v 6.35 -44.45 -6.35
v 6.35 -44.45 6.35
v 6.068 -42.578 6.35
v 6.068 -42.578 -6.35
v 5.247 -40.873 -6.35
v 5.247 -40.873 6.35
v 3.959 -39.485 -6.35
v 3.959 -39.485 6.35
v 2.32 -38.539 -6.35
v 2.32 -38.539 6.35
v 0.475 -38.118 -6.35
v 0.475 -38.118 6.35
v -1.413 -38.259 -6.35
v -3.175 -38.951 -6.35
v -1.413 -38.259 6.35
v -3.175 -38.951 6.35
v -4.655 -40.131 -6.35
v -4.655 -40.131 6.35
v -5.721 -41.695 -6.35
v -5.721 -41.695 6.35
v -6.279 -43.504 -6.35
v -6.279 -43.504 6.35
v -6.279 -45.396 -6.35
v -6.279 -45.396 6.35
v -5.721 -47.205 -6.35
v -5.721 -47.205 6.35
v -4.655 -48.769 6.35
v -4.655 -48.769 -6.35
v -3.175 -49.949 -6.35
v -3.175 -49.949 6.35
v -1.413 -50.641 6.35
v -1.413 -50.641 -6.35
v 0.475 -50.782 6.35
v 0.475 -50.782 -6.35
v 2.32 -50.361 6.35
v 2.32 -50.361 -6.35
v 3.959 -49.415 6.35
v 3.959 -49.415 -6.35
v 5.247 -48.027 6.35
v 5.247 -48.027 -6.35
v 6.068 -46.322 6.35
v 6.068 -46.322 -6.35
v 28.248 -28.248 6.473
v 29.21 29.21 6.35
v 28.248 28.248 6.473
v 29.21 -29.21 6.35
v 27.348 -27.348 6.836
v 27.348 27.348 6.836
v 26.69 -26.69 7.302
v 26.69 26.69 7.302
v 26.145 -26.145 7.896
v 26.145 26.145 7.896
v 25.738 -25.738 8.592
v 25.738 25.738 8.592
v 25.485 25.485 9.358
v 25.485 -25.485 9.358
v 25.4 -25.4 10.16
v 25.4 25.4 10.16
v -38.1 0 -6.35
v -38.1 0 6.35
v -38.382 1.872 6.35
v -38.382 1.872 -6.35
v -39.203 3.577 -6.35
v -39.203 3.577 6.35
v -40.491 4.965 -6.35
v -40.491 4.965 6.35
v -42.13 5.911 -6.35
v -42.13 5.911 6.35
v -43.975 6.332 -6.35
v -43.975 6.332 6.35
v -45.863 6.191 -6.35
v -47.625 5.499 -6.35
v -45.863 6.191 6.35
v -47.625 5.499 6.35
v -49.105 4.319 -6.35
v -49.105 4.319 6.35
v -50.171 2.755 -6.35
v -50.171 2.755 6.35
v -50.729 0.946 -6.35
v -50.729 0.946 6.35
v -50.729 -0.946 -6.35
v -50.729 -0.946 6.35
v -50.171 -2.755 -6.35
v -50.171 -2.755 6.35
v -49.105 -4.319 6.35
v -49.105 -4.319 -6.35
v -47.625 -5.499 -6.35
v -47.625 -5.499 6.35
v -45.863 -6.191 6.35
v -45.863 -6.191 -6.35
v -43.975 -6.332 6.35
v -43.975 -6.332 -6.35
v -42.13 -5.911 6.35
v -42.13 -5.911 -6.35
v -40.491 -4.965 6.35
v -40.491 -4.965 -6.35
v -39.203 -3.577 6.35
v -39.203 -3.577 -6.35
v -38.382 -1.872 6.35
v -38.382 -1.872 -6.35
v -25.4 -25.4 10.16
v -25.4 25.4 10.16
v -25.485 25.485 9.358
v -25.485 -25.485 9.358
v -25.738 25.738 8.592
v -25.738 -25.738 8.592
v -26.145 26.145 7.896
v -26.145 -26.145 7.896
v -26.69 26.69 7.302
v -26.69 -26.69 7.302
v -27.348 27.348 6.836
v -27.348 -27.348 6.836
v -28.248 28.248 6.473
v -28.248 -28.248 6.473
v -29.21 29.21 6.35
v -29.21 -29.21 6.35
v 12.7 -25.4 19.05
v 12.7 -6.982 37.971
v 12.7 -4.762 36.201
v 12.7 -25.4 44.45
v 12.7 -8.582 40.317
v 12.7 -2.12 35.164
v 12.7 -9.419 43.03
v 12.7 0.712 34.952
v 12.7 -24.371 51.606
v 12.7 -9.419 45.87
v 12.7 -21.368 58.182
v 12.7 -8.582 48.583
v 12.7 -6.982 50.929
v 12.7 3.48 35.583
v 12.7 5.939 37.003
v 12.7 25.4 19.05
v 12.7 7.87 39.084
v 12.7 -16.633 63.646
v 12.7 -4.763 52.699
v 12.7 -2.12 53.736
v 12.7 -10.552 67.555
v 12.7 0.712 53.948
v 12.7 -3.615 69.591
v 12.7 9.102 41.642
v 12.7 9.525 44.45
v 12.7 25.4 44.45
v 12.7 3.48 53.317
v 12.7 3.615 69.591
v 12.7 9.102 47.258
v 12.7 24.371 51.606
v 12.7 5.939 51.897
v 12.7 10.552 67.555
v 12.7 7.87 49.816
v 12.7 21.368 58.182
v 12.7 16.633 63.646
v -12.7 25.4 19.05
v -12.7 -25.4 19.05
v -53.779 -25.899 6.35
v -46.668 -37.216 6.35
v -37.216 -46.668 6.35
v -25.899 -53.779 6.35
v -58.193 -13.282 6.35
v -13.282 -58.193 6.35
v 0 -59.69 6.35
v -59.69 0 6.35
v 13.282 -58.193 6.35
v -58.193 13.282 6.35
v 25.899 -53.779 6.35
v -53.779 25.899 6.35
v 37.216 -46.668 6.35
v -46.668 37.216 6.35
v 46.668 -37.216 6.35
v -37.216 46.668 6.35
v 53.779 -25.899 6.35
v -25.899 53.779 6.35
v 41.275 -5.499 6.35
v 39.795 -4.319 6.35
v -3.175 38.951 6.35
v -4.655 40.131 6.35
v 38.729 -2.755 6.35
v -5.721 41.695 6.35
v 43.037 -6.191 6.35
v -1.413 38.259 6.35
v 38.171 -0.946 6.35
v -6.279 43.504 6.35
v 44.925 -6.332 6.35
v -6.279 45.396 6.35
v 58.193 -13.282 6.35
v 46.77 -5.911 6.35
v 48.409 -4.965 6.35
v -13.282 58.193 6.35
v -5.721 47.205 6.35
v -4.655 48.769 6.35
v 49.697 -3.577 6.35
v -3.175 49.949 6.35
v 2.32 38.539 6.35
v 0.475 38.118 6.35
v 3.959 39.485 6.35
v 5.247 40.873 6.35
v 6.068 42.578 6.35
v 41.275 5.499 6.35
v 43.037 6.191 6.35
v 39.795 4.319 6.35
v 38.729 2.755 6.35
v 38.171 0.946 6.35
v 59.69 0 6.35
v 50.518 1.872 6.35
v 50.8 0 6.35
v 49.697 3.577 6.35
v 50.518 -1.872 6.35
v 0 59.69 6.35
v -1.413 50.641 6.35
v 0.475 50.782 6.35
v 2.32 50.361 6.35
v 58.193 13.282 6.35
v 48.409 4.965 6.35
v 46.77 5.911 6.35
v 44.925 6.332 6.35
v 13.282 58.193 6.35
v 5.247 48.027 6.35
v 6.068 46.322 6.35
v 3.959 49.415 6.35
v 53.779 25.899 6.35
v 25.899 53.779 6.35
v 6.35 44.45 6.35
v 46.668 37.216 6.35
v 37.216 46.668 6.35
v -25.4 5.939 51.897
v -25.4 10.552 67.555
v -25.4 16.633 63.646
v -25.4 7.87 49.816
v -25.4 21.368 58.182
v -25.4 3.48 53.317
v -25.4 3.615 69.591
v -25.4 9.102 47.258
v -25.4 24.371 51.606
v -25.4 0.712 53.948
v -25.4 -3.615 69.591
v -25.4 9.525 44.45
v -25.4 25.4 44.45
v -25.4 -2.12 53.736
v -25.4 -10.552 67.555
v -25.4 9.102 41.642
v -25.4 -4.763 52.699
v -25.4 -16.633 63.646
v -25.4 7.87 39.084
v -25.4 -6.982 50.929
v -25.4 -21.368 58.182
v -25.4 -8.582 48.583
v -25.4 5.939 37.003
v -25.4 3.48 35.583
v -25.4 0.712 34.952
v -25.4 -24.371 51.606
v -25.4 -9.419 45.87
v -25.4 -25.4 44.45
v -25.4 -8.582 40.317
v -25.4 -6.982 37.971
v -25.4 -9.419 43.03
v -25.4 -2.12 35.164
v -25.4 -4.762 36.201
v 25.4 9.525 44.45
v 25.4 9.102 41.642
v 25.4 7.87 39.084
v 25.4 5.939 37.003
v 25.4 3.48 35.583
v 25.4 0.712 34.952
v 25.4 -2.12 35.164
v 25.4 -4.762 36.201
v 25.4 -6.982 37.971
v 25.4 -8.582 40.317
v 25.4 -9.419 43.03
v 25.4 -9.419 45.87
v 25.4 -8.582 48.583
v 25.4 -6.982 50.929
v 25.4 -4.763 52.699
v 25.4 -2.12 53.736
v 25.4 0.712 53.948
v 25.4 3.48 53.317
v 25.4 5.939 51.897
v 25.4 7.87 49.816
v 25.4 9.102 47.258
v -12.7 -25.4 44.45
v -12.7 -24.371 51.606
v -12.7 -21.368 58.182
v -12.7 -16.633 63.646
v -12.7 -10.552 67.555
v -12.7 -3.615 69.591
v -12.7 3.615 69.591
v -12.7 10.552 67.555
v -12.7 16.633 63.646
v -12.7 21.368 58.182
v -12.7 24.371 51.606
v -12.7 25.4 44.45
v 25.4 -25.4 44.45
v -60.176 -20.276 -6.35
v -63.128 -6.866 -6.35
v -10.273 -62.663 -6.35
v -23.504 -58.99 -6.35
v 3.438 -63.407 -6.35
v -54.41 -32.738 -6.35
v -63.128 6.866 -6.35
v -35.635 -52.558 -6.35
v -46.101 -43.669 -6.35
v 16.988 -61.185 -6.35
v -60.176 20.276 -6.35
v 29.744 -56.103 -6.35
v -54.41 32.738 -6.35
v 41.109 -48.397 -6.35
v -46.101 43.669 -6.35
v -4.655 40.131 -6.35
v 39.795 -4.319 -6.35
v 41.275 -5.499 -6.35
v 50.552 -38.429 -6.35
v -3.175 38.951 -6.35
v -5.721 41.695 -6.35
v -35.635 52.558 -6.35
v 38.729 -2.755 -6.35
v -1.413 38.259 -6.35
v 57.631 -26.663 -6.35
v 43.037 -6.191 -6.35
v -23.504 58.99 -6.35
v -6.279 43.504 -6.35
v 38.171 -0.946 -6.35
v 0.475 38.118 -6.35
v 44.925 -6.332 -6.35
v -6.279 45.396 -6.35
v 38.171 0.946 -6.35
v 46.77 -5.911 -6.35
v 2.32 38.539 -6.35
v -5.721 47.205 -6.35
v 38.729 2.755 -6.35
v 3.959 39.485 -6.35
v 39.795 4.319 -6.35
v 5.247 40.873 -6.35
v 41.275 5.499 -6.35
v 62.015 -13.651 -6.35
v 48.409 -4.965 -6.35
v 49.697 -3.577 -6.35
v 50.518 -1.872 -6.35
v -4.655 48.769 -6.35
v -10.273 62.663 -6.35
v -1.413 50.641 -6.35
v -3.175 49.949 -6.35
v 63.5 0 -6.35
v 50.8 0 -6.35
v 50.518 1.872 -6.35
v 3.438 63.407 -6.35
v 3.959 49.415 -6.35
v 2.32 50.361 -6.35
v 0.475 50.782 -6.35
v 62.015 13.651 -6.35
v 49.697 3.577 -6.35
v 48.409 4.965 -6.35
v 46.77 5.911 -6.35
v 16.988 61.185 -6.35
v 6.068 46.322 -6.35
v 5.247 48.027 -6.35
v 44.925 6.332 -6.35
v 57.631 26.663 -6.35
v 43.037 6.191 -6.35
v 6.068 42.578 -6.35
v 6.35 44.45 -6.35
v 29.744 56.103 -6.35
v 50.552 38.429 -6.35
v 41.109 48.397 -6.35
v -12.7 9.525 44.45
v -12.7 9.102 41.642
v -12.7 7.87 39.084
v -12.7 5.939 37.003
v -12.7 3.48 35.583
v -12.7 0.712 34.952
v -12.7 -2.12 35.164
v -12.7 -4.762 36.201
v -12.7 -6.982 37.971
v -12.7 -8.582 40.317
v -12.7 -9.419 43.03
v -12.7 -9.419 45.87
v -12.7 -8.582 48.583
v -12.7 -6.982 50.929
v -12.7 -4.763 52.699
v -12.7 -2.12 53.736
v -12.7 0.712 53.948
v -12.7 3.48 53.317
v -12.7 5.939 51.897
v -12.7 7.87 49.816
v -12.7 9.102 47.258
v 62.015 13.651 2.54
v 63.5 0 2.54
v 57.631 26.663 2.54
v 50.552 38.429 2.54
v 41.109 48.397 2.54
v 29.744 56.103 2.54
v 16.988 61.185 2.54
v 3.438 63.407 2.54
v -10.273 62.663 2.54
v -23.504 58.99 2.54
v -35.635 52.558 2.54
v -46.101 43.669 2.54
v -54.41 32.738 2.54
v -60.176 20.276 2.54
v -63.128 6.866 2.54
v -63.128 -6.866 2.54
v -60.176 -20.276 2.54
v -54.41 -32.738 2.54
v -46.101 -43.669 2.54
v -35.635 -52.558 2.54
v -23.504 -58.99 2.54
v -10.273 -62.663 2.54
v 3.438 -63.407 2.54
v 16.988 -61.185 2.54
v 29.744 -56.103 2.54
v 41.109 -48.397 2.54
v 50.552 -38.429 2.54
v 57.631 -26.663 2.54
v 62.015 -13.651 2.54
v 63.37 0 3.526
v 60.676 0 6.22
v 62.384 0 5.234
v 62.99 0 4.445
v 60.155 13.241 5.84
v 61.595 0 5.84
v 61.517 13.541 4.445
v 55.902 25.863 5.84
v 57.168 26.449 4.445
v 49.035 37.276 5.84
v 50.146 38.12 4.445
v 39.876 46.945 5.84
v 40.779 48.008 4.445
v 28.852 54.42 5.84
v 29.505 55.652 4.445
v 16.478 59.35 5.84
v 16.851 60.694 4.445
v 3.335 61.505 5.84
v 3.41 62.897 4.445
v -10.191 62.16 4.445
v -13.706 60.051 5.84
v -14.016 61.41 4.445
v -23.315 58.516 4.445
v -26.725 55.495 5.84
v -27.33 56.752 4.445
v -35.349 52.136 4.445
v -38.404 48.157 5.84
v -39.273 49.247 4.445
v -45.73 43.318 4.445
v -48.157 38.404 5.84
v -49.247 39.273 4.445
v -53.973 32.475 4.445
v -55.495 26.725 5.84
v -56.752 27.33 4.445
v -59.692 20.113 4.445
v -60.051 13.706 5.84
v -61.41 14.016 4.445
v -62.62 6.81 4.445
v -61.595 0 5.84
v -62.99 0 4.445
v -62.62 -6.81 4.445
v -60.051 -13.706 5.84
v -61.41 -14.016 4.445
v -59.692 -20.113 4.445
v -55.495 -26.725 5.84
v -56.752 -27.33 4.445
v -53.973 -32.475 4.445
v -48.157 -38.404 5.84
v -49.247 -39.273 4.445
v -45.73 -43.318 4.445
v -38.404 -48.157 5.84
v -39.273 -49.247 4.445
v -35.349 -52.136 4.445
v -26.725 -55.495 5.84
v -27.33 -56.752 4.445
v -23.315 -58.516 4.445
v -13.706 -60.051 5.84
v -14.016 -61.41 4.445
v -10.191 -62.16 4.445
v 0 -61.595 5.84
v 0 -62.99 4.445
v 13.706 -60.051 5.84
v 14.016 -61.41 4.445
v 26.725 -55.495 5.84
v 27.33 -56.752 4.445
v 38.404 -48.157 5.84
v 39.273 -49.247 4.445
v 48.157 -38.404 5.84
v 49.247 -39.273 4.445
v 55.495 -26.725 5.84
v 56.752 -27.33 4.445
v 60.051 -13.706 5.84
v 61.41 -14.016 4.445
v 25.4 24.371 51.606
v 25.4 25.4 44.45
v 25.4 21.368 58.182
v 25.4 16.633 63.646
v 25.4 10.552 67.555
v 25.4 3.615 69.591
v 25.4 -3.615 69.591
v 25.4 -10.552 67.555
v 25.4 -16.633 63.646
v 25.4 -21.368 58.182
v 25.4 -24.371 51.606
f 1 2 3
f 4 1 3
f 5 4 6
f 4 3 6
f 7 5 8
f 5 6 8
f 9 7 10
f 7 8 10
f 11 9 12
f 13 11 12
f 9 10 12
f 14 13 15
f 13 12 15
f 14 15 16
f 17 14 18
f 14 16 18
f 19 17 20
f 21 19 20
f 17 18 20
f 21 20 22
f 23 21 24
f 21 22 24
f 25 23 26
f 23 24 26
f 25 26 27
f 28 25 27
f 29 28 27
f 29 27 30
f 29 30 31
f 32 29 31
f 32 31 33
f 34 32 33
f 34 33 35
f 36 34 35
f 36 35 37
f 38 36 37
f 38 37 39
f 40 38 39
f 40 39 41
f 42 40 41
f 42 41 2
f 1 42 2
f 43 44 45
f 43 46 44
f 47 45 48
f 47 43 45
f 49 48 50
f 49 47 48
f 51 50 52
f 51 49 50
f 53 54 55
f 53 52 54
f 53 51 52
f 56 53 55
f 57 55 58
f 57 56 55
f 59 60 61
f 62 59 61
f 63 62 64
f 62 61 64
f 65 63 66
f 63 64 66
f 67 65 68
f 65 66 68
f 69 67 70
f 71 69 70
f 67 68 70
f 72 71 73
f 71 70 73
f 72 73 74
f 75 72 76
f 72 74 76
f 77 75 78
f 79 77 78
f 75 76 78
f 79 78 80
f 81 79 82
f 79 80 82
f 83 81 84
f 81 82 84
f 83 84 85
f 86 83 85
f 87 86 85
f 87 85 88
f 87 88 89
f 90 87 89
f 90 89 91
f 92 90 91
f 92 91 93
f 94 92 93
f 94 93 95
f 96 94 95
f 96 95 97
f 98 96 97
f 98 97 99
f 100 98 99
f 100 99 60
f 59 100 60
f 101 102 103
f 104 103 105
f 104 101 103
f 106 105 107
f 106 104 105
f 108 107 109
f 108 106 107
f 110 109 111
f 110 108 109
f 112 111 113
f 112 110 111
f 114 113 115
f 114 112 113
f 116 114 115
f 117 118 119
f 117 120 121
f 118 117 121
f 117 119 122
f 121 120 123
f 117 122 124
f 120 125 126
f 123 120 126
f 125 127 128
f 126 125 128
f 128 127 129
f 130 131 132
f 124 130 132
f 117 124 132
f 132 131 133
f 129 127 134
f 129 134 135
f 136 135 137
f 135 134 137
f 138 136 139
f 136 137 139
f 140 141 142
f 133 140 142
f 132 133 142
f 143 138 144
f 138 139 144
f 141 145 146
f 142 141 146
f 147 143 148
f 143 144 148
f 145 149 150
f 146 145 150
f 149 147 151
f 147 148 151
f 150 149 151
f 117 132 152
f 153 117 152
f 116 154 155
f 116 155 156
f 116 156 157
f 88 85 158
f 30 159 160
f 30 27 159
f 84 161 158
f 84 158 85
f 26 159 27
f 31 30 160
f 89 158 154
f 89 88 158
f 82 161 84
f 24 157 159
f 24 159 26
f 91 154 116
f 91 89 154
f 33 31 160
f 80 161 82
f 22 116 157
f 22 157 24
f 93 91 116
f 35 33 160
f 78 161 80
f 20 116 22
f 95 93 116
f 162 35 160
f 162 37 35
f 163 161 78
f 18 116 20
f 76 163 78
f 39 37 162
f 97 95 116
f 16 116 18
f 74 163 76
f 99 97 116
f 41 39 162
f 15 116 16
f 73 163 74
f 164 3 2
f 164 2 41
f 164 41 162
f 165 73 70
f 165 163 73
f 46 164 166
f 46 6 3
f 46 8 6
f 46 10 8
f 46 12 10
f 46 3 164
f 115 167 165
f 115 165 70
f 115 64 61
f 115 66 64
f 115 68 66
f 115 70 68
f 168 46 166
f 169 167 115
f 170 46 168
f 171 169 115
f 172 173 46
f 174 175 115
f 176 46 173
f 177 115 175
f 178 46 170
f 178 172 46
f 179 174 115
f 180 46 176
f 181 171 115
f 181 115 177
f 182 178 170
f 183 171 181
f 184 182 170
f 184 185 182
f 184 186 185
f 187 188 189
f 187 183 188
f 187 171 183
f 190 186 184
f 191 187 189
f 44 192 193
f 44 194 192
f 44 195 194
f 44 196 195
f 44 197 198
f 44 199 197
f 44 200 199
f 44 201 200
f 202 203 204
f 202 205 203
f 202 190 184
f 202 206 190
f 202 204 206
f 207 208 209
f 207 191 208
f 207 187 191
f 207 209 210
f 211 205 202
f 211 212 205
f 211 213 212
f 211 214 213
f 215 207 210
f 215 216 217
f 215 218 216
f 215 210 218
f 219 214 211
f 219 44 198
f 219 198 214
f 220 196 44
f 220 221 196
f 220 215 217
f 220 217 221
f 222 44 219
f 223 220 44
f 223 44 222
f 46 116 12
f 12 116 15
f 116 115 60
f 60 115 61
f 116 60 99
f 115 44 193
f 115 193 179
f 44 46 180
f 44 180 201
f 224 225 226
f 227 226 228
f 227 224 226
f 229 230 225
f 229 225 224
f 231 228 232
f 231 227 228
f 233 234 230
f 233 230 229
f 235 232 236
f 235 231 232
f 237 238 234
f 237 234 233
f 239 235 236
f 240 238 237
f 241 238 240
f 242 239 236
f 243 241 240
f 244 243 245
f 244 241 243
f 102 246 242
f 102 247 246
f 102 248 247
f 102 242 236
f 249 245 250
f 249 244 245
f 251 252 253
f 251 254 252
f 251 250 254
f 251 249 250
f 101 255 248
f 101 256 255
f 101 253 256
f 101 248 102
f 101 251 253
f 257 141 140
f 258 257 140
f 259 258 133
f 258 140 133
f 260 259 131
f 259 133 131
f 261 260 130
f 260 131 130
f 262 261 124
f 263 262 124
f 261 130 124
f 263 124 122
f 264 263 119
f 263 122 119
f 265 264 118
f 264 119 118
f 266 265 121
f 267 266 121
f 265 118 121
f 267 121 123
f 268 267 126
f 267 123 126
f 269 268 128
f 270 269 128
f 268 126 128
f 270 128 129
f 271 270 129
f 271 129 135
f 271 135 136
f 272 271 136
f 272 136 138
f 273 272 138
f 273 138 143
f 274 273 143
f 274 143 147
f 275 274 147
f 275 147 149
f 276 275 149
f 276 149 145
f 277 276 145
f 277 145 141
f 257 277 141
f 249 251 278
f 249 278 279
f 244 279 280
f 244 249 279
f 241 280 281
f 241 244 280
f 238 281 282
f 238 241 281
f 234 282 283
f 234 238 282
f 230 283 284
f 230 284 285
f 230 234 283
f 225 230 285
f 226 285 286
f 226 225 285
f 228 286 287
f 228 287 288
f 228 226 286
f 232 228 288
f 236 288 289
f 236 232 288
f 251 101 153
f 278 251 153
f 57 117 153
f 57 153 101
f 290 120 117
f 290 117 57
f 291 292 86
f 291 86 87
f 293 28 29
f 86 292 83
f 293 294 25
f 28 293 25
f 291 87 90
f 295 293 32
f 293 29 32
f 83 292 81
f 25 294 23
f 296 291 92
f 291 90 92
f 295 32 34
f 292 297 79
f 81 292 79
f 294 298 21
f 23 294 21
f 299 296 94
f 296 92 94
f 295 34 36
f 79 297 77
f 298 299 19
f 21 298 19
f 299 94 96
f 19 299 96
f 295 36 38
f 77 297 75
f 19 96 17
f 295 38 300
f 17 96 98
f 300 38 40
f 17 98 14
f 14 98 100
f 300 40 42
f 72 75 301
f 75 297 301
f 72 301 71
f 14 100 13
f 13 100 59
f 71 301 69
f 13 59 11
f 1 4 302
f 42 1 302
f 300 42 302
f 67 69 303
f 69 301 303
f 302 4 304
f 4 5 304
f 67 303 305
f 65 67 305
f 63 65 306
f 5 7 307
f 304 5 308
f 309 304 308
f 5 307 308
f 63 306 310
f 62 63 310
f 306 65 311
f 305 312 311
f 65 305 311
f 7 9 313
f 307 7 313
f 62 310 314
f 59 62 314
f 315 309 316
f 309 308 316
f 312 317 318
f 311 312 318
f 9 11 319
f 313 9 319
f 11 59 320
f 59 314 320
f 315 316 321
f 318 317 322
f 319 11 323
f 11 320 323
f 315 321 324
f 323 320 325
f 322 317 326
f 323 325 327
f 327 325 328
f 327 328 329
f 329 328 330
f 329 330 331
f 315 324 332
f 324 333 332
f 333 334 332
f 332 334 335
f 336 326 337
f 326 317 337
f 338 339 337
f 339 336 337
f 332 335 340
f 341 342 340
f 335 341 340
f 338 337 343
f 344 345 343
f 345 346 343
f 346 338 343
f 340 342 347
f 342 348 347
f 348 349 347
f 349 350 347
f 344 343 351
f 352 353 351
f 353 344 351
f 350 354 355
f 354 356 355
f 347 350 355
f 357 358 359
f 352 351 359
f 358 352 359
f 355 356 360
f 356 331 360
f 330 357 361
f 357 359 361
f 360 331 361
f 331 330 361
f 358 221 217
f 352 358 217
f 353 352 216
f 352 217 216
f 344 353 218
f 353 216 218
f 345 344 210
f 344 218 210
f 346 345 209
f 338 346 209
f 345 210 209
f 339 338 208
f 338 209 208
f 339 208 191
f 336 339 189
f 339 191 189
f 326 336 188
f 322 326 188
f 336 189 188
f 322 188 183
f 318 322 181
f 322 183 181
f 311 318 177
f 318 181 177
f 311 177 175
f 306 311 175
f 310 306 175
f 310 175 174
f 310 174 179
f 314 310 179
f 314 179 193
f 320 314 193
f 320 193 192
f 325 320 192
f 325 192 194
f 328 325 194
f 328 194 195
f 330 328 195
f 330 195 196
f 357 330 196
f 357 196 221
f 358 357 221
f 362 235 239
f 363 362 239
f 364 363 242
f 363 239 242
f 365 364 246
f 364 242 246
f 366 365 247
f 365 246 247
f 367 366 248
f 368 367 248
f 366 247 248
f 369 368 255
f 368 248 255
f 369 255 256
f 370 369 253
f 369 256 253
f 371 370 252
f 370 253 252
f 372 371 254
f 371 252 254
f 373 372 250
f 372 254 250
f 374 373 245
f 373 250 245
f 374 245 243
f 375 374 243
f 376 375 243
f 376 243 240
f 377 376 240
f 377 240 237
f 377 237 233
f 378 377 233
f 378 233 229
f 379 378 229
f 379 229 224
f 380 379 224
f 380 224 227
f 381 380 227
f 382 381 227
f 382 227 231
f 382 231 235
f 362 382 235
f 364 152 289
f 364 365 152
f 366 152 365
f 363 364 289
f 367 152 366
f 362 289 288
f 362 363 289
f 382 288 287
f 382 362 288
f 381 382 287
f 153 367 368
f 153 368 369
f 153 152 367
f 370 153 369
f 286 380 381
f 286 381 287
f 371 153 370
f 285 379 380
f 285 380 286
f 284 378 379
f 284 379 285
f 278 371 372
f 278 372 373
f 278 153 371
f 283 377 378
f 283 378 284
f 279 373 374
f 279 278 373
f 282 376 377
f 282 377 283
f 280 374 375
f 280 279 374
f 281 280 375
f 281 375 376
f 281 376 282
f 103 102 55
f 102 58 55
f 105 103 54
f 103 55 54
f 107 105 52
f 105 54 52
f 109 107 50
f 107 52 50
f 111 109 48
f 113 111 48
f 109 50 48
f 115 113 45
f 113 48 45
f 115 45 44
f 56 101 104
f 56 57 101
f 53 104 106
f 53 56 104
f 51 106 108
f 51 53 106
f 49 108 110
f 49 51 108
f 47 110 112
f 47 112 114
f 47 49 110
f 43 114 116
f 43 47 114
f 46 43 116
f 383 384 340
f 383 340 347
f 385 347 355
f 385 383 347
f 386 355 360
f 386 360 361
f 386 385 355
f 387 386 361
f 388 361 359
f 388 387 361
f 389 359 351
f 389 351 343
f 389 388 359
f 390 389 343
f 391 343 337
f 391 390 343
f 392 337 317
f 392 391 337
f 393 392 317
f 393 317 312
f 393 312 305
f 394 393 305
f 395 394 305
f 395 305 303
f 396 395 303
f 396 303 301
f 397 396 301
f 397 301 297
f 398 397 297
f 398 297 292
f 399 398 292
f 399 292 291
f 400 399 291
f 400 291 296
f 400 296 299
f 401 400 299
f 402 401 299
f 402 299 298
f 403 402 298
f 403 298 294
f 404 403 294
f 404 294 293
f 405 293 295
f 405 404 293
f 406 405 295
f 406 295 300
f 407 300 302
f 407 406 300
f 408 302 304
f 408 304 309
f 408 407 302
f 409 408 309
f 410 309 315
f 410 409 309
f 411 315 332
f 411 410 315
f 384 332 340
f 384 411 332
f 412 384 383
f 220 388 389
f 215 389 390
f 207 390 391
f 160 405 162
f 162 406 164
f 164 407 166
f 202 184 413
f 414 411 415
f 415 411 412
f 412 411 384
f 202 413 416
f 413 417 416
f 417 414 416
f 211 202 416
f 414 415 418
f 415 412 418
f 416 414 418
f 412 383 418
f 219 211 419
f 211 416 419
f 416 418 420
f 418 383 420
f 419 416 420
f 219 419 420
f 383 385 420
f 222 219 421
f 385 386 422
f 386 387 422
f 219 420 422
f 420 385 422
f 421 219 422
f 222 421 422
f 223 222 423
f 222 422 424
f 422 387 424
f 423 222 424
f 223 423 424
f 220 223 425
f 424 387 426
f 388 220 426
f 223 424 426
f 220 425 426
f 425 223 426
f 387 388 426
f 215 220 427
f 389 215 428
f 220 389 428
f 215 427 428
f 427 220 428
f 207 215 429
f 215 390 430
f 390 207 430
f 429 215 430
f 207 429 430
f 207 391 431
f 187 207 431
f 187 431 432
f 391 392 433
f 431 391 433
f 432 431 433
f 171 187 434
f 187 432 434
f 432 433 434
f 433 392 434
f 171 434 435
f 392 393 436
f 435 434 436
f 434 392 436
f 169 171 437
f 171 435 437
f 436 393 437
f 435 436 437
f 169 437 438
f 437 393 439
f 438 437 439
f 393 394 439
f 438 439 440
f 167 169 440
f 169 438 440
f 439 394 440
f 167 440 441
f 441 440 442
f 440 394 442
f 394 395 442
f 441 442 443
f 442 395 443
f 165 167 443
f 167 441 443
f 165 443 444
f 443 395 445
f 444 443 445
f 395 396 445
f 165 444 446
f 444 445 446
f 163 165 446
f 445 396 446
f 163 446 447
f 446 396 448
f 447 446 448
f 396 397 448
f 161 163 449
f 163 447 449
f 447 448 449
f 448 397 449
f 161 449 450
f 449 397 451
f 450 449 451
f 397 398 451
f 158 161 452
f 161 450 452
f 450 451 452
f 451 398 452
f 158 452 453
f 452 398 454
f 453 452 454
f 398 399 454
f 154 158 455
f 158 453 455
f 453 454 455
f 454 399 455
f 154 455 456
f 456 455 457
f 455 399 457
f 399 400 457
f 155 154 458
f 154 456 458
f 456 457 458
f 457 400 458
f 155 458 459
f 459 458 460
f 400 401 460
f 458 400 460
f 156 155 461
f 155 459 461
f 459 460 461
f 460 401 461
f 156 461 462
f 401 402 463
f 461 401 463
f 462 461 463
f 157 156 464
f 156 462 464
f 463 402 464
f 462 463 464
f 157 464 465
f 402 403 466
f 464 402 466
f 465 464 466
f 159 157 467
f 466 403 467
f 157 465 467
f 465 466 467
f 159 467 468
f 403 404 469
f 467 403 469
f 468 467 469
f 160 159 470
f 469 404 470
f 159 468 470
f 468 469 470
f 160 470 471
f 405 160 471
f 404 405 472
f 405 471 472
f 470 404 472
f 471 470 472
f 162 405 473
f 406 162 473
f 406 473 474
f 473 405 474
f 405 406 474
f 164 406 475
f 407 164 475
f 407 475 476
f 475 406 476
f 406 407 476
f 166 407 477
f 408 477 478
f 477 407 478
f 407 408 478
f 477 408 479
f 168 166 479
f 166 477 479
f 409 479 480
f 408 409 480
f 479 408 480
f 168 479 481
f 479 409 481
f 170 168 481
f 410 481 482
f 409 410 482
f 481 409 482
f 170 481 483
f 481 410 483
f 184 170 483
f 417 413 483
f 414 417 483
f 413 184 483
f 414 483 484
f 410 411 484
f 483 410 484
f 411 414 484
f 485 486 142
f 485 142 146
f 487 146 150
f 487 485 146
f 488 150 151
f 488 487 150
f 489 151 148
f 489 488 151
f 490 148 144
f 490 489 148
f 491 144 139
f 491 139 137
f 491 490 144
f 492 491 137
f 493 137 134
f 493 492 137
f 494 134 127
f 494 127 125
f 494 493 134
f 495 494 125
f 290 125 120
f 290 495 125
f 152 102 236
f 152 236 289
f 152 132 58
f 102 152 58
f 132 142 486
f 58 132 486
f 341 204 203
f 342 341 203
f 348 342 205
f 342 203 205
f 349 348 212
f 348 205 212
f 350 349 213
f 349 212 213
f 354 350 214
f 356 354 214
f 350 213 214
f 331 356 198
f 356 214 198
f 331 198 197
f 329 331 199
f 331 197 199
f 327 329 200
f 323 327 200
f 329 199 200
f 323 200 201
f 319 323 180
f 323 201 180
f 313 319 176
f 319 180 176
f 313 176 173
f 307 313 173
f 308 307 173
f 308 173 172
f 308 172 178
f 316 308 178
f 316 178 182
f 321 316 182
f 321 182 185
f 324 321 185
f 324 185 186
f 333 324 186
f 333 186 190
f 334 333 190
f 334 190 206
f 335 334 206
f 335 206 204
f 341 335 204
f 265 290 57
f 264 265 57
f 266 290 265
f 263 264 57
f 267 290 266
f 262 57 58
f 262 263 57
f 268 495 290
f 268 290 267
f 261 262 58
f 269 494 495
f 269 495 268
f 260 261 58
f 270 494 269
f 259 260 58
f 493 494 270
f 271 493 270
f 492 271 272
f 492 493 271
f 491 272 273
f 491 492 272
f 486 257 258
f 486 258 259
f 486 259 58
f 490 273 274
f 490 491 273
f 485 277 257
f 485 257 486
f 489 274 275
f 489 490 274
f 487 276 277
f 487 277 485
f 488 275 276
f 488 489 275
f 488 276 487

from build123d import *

# Parameters (mm, degrees)
F0_R      = 63.5
F1_DEPTH  = 6.35
F2_R      = 6.35
F3_DEPTH  = 12.701
F5_DEPTH  = 25.4
F7_DEPTH  = 12.7
F8_R      = 9.525
F9_DEPTH  = 12.7
F10_DEPTH = 88.901
F11_R     = 3.81


with BuildPart() as f1:
    # F0 (on Top) → F1 (new body, symmetric)
    with BuildSketch(Plane.XY):
        Circle(F0_R)
    extrude(amount=F1_DEPTH, both=True)

    # F2 (on face) → F3 (cut, through all)
    with BuildSketch(Plane.XY.offset(6.35)):
        with Locations((0, 44.45)):
            Circle(F2_R)
        with Locations((44.45, 0)):
            Circle(F2_R)
        with Locations((0, -44.45)):
            Circle(F2_R)
        with Locations((-44.45, 0)):
            Circle(F2_R)
    extrude(amount=-F3_DEPTH, mode=Mode.SUBTRACT)

    # F4 (on Front) → F5 (join, symmetric)
    with BuildSketch(Plane.XZ):
        Polygon((12.7, 19.05), (-12.7, 19.05), (-12.7, 44.45), (-25.4, 44.45), (-25.4, 6.35), (25.4, 6.35), (25.4, 44.45), (12.7, 44.45), align=None)
    extrude(amount=F5_DEPTH, both=True)

    # F6 (on face) → F7 (join)
    with BuildSketch(Plane.YZ.offset(25.4)):
        with BuildLine():
            Line((-25.4, 44.45), (25.4, 44.45))
            ThreePointArc((25.4, 44.45), (0, 69.85), (-25.4, 44.45))
        make_face()
    extrude(amount=-F7_DEPTH)

    # F8 (on face) → F9 (join)
    with BuildSketch(Plane(origin=(-25.4, 0, 0), x_dir=(0, -1, 0), z_dir=(-1, 0, 0))):
        with Locations((0, 44.45)):
            Circle(F8_R)
        with BuildLine():
            Line((9.525, 44.45), (25.4, 44.45))
            ThreePointArc((25.4, 44.45), (0, 69.85), (-25.4, 44.45))
            Line((-25.4, 44.45), (-9.525, 44.45))
            ThreePointArc((-9.525, 44.45), (0, 53.975), (9.525, 44.45))
        make_face()
    extrude(amount=-F9_DEPTH)

    # F8 (on face) → F10 (cut, through all)
    with BuildSketch(Plane(origin=(-25.4, 0, 0), x_dir=(0, -1, 0), z_dir=(-1, 0, 0))):
        with BuildLine():
            Line((-9.525, 44.45), (9.525, 44.45))
            ThreePointArc((9.525, 44.45), (0, 53.975), (-9.525, 44.45))
        make_face()
        with BuildLine():
            ThreePointArc((-9.525, 44.45), (0, 34.925), (9.525, 44.45))
            Line((9.525, 44.45), (-9.525, 44.45))
        make_face()
    extrude(amount=-F10_DEPTH, mode=Mode.SUBTRACT)

    # F11
    f11_edges = [f1.edges().sort_by_distance(p)[0] for p in [
        (0, -25.4, 6.35),
        (-25.4, 0, 6.35),
        (0, 25.4, 6.35),
        (25.4, 0, 6.35),
        (-63.5, 0, 6.35),
    ]]
    fillet(f11_edges, radius=F11_R)


solid = f1.part
